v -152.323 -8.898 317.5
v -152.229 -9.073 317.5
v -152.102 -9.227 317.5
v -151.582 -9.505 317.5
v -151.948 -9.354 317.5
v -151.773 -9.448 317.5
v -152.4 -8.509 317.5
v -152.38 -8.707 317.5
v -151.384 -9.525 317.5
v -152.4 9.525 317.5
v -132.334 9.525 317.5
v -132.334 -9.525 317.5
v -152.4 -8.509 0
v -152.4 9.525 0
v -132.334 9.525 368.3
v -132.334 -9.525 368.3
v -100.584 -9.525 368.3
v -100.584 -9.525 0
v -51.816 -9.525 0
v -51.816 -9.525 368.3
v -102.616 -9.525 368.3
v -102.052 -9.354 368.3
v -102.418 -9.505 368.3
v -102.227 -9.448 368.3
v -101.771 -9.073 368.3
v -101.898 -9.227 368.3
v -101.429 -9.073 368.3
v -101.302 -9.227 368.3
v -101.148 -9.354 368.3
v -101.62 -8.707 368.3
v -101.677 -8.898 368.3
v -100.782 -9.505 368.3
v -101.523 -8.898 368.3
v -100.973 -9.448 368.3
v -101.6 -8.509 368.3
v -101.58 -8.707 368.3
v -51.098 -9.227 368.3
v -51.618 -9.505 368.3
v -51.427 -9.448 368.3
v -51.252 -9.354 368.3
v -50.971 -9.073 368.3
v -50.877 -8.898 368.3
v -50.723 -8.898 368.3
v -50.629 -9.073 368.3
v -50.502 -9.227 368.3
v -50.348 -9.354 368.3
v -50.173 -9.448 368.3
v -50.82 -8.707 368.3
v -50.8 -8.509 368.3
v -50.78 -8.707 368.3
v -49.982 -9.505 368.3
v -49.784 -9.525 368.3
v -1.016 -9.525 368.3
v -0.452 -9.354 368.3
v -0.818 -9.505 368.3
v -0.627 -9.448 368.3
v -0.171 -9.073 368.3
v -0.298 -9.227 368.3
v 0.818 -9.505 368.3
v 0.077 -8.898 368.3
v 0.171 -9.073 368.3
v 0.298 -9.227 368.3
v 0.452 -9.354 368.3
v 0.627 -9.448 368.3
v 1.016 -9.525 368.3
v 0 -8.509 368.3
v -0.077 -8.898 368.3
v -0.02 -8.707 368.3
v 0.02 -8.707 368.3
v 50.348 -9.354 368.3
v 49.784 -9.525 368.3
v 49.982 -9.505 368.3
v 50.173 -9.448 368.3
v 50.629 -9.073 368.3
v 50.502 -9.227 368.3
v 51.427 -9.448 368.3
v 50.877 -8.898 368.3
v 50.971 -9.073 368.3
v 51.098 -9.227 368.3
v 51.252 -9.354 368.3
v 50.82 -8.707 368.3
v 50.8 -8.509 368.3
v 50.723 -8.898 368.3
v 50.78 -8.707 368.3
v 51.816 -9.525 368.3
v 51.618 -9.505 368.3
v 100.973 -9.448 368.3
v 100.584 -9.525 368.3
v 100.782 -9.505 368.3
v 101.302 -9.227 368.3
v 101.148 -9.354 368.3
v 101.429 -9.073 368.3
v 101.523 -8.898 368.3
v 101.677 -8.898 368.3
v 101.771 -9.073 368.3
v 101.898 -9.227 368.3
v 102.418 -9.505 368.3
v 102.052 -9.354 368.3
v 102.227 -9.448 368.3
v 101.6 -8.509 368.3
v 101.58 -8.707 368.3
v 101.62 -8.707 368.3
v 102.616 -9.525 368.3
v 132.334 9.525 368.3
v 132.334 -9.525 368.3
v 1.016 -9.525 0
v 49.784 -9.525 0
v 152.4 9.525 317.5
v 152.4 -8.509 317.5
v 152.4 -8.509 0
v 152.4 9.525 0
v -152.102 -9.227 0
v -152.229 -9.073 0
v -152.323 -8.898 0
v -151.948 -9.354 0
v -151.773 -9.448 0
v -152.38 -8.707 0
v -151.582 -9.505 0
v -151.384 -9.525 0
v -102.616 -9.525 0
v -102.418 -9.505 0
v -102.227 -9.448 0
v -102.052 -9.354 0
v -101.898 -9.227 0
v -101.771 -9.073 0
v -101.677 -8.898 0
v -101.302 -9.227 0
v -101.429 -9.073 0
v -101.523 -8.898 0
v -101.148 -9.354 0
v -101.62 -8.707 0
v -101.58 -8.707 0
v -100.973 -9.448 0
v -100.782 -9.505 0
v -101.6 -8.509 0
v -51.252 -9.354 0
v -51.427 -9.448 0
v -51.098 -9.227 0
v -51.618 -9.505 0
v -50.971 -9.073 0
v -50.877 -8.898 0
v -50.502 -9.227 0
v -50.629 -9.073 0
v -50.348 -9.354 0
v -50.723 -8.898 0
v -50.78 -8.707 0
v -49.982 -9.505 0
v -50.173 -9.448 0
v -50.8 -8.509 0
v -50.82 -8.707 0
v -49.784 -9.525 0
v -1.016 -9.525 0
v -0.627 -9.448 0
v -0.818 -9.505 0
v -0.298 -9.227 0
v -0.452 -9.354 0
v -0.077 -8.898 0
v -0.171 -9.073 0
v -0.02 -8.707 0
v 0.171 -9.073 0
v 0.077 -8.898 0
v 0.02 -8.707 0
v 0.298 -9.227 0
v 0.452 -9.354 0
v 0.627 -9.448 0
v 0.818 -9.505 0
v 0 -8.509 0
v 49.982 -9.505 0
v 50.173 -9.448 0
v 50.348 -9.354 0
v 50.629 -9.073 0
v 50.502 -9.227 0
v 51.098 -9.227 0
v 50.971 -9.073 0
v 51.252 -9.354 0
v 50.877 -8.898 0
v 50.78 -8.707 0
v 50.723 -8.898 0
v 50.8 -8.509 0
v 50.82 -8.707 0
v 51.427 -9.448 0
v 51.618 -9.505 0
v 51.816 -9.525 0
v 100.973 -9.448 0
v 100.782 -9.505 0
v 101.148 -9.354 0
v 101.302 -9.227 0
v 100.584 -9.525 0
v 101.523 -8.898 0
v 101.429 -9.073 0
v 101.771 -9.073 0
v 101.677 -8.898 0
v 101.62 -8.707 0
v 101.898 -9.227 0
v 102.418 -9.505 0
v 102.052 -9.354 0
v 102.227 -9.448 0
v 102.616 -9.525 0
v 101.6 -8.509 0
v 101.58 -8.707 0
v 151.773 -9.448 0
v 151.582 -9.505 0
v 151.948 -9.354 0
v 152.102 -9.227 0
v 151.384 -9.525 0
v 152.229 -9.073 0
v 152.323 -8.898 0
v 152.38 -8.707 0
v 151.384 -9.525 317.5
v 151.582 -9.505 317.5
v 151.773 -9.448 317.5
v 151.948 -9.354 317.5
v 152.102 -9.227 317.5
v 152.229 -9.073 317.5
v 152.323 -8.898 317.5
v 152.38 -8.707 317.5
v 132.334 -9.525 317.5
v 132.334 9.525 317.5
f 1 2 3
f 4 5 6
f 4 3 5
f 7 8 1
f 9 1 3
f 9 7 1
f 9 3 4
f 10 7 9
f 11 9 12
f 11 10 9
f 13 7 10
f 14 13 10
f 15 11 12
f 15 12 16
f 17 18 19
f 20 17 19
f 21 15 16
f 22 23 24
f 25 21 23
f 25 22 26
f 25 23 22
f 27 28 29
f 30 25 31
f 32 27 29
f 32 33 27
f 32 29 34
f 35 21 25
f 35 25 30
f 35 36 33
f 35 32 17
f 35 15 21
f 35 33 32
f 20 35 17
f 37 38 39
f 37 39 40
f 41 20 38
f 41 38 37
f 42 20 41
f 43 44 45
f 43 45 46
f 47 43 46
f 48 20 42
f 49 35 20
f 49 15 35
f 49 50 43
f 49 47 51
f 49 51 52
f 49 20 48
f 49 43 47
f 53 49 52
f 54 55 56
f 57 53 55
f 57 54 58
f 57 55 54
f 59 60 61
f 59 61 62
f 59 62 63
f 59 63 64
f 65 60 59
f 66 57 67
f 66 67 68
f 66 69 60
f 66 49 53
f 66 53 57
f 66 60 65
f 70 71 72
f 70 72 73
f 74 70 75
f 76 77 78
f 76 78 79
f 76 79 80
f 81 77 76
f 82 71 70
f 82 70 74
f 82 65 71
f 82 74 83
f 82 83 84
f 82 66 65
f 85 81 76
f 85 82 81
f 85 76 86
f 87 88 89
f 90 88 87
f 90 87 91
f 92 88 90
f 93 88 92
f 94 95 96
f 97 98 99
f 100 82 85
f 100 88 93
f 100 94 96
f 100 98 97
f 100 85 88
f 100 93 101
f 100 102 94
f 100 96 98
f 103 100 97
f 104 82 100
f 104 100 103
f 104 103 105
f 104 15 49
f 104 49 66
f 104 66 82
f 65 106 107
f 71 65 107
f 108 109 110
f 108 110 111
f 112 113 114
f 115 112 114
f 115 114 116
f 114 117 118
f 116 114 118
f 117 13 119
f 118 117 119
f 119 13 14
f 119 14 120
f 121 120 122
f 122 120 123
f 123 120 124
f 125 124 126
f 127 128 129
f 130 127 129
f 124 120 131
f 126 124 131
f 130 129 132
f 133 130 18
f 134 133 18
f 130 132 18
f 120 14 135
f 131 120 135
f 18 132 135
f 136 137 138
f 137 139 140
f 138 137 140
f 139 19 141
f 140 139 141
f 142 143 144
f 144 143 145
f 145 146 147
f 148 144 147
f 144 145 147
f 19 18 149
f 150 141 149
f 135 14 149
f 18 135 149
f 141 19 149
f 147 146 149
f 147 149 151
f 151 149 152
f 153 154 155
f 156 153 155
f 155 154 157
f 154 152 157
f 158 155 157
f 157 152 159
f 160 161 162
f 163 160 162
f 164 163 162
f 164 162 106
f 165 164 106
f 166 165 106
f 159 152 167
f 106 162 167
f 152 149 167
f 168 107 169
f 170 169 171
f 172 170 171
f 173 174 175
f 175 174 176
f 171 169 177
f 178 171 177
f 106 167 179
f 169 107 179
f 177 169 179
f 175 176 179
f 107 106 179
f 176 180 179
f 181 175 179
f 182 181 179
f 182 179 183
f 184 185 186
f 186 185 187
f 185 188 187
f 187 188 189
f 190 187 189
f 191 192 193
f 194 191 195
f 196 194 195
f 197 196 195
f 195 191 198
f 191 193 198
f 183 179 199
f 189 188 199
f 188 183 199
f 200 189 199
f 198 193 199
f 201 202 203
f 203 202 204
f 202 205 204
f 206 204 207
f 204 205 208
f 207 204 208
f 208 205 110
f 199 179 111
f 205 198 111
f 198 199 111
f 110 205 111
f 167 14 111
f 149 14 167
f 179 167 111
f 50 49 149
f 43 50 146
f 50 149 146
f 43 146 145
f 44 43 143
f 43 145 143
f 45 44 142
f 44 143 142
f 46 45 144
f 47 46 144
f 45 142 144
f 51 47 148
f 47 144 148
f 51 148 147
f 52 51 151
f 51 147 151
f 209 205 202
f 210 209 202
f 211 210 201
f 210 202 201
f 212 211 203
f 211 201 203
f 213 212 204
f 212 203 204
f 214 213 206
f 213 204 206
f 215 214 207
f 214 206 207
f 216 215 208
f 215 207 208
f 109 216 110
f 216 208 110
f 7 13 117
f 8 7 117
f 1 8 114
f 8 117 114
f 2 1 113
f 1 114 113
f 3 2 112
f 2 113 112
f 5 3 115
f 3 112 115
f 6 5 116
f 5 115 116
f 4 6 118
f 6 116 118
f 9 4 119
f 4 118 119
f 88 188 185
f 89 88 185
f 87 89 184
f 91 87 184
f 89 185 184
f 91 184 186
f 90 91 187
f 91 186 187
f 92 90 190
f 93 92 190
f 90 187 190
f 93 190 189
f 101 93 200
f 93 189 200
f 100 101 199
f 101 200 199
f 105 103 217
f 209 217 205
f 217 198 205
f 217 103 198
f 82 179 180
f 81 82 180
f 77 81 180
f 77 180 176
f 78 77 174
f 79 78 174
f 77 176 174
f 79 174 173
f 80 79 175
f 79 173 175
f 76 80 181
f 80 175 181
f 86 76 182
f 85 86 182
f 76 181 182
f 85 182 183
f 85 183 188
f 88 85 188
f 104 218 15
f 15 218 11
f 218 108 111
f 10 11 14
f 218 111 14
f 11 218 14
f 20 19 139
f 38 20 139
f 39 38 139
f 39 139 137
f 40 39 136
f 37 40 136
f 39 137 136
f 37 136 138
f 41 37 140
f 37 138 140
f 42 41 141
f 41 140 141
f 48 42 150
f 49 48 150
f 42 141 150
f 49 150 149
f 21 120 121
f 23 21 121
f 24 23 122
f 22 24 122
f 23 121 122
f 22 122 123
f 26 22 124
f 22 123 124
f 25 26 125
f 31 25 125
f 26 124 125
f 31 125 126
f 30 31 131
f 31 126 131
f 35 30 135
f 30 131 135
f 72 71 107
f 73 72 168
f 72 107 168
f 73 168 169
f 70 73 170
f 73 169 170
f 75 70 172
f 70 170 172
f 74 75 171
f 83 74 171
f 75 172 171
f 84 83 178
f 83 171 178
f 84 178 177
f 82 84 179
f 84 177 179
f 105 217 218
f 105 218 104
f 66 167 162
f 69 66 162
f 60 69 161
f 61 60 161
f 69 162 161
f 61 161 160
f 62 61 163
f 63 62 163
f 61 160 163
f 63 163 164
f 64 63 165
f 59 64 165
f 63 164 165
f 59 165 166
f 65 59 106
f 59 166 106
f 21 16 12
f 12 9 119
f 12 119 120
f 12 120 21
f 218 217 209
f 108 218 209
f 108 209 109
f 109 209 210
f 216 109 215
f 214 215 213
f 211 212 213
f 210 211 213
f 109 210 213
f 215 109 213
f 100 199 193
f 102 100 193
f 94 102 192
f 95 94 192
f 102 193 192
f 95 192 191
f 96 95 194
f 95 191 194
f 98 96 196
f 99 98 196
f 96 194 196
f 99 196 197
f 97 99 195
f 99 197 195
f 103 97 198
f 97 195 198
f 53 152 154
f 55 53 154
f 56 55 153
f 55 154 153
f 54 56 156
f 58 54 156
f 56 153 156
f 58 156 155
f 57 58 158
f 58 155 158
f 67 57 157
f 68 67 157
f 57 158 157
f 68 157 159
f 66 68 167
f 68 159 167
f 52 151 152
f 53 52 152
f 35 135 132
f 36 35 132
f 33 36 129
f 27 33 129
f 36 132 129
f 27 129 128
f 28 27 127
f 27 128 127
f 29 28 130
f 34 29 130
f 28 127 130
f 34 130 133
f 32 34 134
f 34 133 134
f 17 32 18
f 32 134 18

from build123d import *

# Parameters (mm, degrees)
F1_DEPTH = 368.3
F2_W     = 452.085844
F2_H     = 300.708675
F2_W_2   = 450.040182
F2_H_2   = 272.069744
F3_DEPTH = 381
F4_W     = 46.388466
F4_H     = 111.5514
F4_W_2   = 66.730906
F4_H_2   = 130.886974
F5_DEPTH = 12.7


with BuildPart() as f1:
    # F0 (on Top) → F1 (new body)
    with BuildSketch(Plane.XY):
        with BuildLine():
            Line((458.216, -9.525), (533.4, -9.525))
            Line((533.4, -9.525), (533.4, 9.525))
            Line((533.4, 9.525), (-533.4, 9.525))
            Line((-533.4, 9.525), (-533.4, -9.525))
            Line((-533.4, -9.525), (-509.016, -9.525))
            ThreePointArc((-509.016, -9.525), (-508.29758, -9.22742), (-508, -8.509))
            ThreePointArc((-508, -8.509), (-507.70242, -9.22742), (-506.984, -9.525))
            Line((-506.984, -9.525), (-458.216, -9.525))
            ThreePointArc((-458.216, -9.525), (-457.49758, -9.22742), (-457.2, -8.509))
            ThreePointArc((-457.2, -8.509), (-456.90242, -9.22742), (-456.184, -9.525))
            Line((-456.184, -9.525), (-407.416, -9.525))
            ThreePointArc((-407.416, -9.525), (-406.69758, -9.22742), (-406.4, -8.509))
            ThreePointArc((-406.4, -8.509), (-406.10242, -9.22742), (-405.384, -9.525))
            Line((-405.384, -9.525), (-356.616, -9.525))
            ThreePointArc((-356.616, -9.525), (-355.89758, -9.22742), (-355.6, -8.509))
            ThreePointArc((-355.6, -8.509), (-355.30242, -9.22742), (-354.584, -9.525))
            Line((-354.584, -9.525), (-305.816, -9.525))
            ThreePointArc((-305.816, -9.525), (-305.09758, -9.22742), (-304.8, -8.509))
            ThreePointArc((-304.8, -8.509), (-304.50242, -9.22742), (-303.784, -9.525))
            Line((-303.784, -9.525), (-255.016, -9.525))
            ThreePointArc((-255.016, -9.525), (-254.29758, -9.22742), (-254, -8.509))
            ThreePointArc((-254, -8.509), (-253.70242, -9.22742), (-252.984, -9.525))
            Line((-252.984, -9.525), (-204.216, -9.525))
            ThreePointArc((-204.216, -9.525), (-203.49758, -9.22742), (-203.2, -8.509))
            ThreePointArc((-203.2, -8.509), (-202.90242, -9.22742), (-202.184, -9.525))
            Line((-202.184, -9.525), (-153.416, -9.525))
            ThreePointArc((-153.416, -9.525), (-152.69758, -9.22742), (-152.4, -8.509))
            ThreePointArc((-152.4, -8.509), (-152.10242, -9.22742), (-151.384, -9.525))
            Line((-151.384, -9.525), (-102.616, -9.525))
            ThreePointArc((-102.616, -9.525), (-101.89758, -9.22742), (-101.6, -8.509))
            ThreePointArc((-101.6, -8.509), (-101.30242, -9.22742), (-100.584, -9.525))
            Line((-100.584, -9.525), (-51.816, -9.525))
            ThreePointArc((-51.816, -9.525), (-51.09758, -9.22742), (-50.8, -8.509))
            ThreePointArc((-50.8, -8.509), (-50.50242, -9.22742), (-49.784, -9.525))
            Line((-49.784, -9.525), (-1.016, -9.525))
            ThreePointArc((-1.016, -9.525), (-0.29758, -9.22742), (0, -8.509))
            ThreePointArc((0, -8.509), (0.29758, -9.22742), (1.016, -9.525))
            Line((1.016, -9.525), (49.784, -9.525))
            ThreePointArc((49.784, -9.525), (50.50242, -9.22742), (50.8, -8.509))
            ThreePointArc((50.8, -8.509), (51.09758, -9.22742), (51.816, -9.525))
            Line((51.816, -9.525), (100.584, -9.525))
            ThreePointArc((100.584, -9.525), (101.30242, -9.22742), (101.6, -8.509))
            ThreePointArc((101.6, -8.509), (101.89758, -9.22742), (102.616, -9.525))
            Line((102.616, -9.525), (151.384, -9.525))
            ThreePointArc((151.384, -9.525), (152.10242, -9.22742), (152.4, -8.509))
            ThreePointArc((152.4, -8.509), (152.69758, -9.22742), (153.416, -9.525))
            Line((153.416, -9.525), (202.184, -9.525))
            ThreePointArc((202.184, -9.525), (202.90242, -9.22742), (203.2, -8.509))
            ThreePointArc((203.2, -8.509), (203.49758, -9.22742), (204.216, -9.525))
            Line((204.216, -9.525), (252.984, -9.525))
            ThreePointArc((252.984, -9.525), (253.70242, -9.22742), (254, -8.509))
            ThreePointArc((254, -8.509), (254.29758, -9.22742), (255.016, -9.525))
            Line((255.016, -9.525), (303.784, -9.525))
            ThreePointArc((303.784, -9.525), (304.50242, -9.22742), (304.8, -8.509))
            ThreePointArc((304.8, -8.509), (305.09758, -9.22742), (305.816, -9.525))
            Line((305.816, -9.525), (354.584, -9.525))
            ThreePointArc((354.584, -9.525), (355.30242, -9.22742), (355.6, -8.509))
            ThreePointArc((355.6, -8.509), (355.89758, -9.22742), (356.616, -9.525))
            Line((356.616, -9.525), (405.384, -9.525))
            ThreePointArc((405.384, -9.525), (406.10242, -9.22742), (406.4, -8.509))
            ThreePointArc((406.4, -8.509), (406.69758, -9.22742), (407.416, -9.525))
            Line((407.416, -9.525), (456.184, -9.525))
            ThreePointArc((456.184, -9.525), (456.90242, -9.22742), (457.2, -8.509))
            ThreePointArc((457.2, -8.509), (457.49758, -9.22742), (458.216, -9.525))
        make_face()
        with BuildLine():
            ThreePointArc((-508, -8.509), (-508.29758, -9.22742), (-509.016, -9.525))
            Line((-509.016, -9.525), (-506.984, -9.525))
            ThreePointArc((-506.984, -9.525), (-507.70242, -9.22742), (-508, -8.509))
        make_face()
    extrude(amount=F1_DEPTH)

    # F2 (on Top) → F3 (cut)
    with BuildSketch(Plane.XY):
        with Locations((-378.442922, -15.51013)):
            Rectangle(F2_W, F2_H)
        with Locations((377.420091, 0.854973)):
            Rectangle(F2_W_2, F2_H_2)
    extrude(amount=F3_DEPTH, mode=Mode.SUBTRACT)

    # F4 (on Front) → F5 (cut, symmetric)
    with BuildSketch(Plane.XZ):
        with Locations((-155.528233, 373.2757)):
            Rectangle(F4_W, F4_H)
        with Locations((165.699453, 382.943487)):
            Rectangle(F4_W_2, F4_H_2)
    extrude(amount=F5_DEPTH, both=True, mode=Mode.SUBTRACT)


solid = f1.part
